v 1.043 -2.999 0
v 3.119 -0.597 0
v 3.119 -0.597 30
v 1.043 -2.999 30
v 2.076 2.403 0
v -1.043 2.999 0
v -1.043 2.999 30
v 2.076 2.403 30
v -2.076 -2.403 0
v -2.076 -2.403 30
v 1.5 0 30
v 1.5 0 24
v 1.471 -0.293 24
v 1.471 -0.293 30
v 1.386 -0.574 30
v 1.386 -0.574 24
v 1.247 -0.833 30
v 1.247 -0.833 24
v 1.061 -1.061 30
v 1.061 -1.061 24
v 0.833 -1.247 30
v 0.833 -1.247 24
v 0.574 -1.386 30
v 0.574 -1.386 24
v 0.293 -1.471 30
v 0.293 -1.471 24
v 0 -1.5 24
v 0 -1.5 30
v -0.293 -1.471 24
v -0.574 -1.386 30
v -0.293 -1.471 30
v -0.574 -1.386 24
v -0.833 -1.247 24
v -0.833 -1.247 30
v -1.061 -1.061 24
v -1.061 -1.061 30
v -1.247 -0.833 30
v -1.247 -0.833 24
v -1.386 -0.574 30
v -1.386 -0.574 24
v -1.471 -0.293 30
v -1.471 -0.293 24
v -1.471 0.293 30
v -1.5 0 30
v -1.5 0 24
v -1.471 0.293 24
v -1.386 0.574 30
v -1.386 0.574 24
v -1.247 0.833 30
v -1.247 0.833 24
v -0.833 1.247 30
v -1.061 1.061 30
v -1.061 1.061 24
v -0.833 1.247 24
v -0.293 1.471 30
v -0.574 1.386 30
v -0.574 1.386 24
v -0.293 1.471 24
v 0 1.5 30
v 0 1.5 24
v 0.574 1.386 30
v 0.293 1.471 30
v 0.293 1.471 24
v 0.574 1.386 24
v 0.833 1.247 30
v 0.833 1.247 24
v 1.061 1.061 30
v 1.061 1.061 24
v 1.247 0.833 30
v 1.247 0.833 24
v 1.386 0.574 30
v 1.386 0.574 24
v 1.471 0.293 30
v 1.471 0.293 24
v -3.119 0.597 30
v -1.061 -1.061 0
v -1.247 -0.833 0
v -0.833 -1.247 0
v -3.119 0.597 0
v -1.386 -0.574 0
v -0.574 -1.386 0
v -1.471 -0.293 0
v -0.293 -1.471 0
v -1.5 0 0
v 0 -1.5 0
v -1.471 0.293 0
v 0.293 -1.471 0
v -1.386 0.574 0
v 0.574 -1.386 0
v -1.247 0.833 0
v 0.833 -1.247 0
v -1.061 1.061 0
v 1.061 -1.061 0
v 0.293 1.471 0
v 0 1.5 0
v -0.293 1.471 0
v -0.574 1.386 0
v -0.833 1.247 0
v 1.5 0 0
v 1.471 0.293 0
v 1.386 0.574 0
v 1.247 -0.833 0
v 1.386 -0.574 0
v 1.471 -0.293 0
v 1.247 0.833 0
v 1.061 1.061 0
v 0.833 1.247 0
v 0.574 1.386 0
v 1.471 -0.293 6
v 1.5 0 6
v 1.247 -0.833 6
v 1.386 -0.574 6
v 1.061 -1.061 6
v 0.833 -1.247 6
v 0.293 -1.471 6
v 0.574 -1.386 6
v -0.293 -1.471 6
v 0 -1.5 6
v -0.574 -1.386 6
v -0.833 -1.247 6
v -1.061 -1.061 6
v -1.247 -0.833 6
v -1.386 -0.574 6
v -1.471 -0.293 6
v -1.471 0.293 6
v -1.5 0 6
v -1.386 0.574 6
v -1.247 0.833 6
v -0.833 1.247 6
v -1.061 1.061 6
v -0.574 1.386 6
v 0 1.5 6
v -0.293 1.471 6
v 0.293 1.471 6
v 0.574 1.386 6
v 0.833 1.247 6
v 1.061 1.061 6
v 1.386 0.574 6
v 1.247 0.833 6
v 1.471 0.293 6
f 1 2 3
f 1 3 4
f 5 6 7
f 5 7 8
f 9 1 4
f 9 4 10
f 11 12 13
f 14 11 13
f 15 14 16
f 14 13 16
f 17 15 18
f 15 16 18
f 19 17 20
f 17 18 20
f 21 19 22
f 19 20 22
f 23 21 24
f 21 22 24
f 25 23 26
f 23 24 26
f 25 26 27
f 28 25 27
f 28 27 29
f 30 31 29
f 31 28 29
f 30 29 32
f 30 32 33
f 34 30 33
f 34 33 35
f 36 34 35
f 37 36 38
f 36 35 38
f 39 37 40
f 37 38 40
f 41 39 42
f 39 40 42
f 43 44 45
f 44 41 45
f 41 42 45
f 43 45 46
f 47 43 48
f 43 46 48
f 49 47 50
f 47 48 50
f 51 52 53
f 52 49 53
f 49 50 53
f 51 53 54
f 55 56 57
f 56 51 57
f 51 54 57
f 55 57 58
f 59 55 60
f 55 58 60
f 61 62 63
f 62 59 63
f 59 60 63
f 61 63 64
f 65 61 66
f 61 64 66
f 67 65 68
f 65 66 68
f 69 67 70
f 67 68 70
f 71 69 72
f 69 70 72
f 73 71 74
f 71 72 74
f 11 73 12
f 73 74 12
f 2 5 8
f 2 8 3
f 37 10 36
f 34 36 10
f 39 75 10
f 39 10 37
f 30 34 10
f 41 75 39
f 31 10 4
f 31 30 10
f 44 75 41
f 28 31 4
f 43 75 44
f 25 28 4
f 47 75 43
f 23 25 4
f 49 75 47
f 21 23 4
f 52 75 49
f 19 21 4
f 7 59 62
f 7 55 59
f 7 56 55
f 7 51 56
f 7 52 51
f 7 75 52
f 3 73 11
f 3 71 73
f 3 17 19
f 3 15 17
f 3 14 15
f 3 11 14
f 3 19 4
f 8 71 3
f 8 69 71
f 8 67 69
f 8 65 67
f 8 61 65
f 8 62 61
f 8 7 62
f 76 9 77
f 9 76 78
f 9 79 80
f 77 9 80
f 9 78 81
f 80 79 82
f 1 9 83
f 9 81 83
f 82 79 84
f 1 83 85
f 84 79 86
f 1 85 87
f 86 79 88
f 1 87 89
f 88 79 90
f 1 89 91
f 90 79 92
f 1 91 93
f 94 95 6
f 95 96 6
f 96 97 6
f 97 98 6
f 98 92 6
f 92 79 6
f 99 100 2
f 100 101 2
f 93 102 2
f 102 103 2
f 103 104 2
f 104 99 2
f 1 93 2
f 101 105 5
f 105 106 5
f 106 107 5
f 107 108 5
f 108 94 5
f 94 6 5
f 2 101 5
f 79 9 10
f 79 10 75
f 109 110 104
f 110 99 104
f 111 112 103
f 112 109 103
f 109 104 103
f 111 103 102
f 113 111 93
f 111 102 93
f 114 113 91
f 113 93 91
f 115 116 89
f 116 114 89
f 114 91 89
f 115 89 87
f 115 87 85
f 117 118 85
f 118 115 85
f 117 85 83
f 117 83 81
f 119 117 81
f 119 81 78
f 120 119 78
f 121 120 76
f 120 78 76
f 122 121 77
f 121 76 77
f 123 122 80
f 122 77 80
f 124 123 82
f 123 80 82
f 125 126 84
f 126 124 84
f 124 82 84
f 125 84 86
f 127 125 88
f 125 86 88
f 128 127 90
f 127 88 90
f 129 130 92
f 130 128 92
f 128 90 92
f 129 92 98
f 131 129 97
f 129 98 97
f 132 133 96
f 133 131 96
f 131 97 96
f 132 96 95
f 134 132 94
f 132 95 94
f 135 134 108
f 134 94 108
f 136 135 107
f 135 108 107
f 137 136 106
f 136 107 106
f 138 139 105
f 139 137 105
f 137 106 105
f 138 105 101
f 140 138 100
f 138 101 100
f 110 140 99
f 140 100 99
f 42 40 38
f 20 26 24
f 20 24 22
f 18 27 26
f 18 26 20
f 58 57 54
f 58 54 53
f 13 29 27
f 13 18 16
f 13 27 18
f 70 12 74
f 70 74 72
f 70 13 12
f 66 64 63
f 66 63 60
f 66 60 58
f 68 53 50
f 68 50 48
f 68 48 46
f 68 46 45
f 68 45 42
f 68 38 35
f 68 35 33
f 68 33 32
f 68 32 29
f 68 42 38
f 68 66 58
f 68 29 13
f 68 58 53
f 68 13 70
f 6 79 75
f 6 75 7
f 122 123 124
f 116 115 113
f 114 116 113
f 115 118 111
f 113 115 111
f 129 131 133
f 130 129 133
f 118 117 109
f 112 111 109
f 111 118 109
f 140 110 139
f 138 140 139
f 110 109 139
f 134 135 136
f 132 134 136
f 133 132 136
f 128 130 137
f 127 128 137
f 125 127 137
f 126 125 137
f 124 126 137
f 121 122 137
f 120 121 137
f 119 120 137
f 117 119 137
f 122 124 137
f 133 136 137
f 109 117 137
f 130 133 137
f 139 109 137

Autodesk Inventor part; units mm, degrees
ref_plane "YZ Plane" through (0, 0, 0) normal (1, 0, 0) x (0, 1, 0)
ref_plane "XZ Plane" through (0, 0, 0) normal (0, 1, 0) x (-1, 0, 0)
ref_plane "XY Plane" through (0, 0, 0) normal (0, 0, 1) x (1, 0, 0)
sketch "スケッチ1" plane through (0, 0, 0) normal (0, 0, 1) x (1, 0, 0)
  circle A0 centre (0, 0) radius 3
  circle A1 centre (0, 0) radius 1.5
  line L0 (2.0761, 2.4027) -> (3.1189, -0.5966)
  line L1 (3.1189, -0.5966) -> (1.0427, -2.9993)
  line L2 (1.0427, -2.9993) -> (-2.0761, -2.4027)
  line L3 (-2.0761, -2.4027) -> (-3.1189, 0.5966)
  line L4 (-3.1189, 0.5966) -> (-1.0427, 2.9993)
  line L5 (-1.0427, 2.9993) -> (2.0761, 2.4027)
  dimension "d0" = 6
  dimension "d1" = 3
  dimension "d13" = 5.5
extrude "押し出し1" add sketch "スケッチ1" along normal blind 30 contours L0 A0 L1 L2 L3 L4 L5 | A0 L5 L0 | L0 L1 A0 | A0 L4 L5 | L1 L2 A0 | A0 L3 L4 | L2 L3 A0
thread "ねじ1" size "M3x0.5" class "6H" standard "ANSI Metric M Profile" length 100
extrude "押し出し2" add sketch "スケッチ1" along normal blind 24 contours A1
extrude "押し出し3" cut sketch "スケッチ1" along normal blind 6 contours A1
thread "ねじ2" size "M3x0.5" class "6H" standard "ANSI Metric M Profile" full length
properties part number "スペーサーM3L30樹脂" material "PBT プラスチック"
